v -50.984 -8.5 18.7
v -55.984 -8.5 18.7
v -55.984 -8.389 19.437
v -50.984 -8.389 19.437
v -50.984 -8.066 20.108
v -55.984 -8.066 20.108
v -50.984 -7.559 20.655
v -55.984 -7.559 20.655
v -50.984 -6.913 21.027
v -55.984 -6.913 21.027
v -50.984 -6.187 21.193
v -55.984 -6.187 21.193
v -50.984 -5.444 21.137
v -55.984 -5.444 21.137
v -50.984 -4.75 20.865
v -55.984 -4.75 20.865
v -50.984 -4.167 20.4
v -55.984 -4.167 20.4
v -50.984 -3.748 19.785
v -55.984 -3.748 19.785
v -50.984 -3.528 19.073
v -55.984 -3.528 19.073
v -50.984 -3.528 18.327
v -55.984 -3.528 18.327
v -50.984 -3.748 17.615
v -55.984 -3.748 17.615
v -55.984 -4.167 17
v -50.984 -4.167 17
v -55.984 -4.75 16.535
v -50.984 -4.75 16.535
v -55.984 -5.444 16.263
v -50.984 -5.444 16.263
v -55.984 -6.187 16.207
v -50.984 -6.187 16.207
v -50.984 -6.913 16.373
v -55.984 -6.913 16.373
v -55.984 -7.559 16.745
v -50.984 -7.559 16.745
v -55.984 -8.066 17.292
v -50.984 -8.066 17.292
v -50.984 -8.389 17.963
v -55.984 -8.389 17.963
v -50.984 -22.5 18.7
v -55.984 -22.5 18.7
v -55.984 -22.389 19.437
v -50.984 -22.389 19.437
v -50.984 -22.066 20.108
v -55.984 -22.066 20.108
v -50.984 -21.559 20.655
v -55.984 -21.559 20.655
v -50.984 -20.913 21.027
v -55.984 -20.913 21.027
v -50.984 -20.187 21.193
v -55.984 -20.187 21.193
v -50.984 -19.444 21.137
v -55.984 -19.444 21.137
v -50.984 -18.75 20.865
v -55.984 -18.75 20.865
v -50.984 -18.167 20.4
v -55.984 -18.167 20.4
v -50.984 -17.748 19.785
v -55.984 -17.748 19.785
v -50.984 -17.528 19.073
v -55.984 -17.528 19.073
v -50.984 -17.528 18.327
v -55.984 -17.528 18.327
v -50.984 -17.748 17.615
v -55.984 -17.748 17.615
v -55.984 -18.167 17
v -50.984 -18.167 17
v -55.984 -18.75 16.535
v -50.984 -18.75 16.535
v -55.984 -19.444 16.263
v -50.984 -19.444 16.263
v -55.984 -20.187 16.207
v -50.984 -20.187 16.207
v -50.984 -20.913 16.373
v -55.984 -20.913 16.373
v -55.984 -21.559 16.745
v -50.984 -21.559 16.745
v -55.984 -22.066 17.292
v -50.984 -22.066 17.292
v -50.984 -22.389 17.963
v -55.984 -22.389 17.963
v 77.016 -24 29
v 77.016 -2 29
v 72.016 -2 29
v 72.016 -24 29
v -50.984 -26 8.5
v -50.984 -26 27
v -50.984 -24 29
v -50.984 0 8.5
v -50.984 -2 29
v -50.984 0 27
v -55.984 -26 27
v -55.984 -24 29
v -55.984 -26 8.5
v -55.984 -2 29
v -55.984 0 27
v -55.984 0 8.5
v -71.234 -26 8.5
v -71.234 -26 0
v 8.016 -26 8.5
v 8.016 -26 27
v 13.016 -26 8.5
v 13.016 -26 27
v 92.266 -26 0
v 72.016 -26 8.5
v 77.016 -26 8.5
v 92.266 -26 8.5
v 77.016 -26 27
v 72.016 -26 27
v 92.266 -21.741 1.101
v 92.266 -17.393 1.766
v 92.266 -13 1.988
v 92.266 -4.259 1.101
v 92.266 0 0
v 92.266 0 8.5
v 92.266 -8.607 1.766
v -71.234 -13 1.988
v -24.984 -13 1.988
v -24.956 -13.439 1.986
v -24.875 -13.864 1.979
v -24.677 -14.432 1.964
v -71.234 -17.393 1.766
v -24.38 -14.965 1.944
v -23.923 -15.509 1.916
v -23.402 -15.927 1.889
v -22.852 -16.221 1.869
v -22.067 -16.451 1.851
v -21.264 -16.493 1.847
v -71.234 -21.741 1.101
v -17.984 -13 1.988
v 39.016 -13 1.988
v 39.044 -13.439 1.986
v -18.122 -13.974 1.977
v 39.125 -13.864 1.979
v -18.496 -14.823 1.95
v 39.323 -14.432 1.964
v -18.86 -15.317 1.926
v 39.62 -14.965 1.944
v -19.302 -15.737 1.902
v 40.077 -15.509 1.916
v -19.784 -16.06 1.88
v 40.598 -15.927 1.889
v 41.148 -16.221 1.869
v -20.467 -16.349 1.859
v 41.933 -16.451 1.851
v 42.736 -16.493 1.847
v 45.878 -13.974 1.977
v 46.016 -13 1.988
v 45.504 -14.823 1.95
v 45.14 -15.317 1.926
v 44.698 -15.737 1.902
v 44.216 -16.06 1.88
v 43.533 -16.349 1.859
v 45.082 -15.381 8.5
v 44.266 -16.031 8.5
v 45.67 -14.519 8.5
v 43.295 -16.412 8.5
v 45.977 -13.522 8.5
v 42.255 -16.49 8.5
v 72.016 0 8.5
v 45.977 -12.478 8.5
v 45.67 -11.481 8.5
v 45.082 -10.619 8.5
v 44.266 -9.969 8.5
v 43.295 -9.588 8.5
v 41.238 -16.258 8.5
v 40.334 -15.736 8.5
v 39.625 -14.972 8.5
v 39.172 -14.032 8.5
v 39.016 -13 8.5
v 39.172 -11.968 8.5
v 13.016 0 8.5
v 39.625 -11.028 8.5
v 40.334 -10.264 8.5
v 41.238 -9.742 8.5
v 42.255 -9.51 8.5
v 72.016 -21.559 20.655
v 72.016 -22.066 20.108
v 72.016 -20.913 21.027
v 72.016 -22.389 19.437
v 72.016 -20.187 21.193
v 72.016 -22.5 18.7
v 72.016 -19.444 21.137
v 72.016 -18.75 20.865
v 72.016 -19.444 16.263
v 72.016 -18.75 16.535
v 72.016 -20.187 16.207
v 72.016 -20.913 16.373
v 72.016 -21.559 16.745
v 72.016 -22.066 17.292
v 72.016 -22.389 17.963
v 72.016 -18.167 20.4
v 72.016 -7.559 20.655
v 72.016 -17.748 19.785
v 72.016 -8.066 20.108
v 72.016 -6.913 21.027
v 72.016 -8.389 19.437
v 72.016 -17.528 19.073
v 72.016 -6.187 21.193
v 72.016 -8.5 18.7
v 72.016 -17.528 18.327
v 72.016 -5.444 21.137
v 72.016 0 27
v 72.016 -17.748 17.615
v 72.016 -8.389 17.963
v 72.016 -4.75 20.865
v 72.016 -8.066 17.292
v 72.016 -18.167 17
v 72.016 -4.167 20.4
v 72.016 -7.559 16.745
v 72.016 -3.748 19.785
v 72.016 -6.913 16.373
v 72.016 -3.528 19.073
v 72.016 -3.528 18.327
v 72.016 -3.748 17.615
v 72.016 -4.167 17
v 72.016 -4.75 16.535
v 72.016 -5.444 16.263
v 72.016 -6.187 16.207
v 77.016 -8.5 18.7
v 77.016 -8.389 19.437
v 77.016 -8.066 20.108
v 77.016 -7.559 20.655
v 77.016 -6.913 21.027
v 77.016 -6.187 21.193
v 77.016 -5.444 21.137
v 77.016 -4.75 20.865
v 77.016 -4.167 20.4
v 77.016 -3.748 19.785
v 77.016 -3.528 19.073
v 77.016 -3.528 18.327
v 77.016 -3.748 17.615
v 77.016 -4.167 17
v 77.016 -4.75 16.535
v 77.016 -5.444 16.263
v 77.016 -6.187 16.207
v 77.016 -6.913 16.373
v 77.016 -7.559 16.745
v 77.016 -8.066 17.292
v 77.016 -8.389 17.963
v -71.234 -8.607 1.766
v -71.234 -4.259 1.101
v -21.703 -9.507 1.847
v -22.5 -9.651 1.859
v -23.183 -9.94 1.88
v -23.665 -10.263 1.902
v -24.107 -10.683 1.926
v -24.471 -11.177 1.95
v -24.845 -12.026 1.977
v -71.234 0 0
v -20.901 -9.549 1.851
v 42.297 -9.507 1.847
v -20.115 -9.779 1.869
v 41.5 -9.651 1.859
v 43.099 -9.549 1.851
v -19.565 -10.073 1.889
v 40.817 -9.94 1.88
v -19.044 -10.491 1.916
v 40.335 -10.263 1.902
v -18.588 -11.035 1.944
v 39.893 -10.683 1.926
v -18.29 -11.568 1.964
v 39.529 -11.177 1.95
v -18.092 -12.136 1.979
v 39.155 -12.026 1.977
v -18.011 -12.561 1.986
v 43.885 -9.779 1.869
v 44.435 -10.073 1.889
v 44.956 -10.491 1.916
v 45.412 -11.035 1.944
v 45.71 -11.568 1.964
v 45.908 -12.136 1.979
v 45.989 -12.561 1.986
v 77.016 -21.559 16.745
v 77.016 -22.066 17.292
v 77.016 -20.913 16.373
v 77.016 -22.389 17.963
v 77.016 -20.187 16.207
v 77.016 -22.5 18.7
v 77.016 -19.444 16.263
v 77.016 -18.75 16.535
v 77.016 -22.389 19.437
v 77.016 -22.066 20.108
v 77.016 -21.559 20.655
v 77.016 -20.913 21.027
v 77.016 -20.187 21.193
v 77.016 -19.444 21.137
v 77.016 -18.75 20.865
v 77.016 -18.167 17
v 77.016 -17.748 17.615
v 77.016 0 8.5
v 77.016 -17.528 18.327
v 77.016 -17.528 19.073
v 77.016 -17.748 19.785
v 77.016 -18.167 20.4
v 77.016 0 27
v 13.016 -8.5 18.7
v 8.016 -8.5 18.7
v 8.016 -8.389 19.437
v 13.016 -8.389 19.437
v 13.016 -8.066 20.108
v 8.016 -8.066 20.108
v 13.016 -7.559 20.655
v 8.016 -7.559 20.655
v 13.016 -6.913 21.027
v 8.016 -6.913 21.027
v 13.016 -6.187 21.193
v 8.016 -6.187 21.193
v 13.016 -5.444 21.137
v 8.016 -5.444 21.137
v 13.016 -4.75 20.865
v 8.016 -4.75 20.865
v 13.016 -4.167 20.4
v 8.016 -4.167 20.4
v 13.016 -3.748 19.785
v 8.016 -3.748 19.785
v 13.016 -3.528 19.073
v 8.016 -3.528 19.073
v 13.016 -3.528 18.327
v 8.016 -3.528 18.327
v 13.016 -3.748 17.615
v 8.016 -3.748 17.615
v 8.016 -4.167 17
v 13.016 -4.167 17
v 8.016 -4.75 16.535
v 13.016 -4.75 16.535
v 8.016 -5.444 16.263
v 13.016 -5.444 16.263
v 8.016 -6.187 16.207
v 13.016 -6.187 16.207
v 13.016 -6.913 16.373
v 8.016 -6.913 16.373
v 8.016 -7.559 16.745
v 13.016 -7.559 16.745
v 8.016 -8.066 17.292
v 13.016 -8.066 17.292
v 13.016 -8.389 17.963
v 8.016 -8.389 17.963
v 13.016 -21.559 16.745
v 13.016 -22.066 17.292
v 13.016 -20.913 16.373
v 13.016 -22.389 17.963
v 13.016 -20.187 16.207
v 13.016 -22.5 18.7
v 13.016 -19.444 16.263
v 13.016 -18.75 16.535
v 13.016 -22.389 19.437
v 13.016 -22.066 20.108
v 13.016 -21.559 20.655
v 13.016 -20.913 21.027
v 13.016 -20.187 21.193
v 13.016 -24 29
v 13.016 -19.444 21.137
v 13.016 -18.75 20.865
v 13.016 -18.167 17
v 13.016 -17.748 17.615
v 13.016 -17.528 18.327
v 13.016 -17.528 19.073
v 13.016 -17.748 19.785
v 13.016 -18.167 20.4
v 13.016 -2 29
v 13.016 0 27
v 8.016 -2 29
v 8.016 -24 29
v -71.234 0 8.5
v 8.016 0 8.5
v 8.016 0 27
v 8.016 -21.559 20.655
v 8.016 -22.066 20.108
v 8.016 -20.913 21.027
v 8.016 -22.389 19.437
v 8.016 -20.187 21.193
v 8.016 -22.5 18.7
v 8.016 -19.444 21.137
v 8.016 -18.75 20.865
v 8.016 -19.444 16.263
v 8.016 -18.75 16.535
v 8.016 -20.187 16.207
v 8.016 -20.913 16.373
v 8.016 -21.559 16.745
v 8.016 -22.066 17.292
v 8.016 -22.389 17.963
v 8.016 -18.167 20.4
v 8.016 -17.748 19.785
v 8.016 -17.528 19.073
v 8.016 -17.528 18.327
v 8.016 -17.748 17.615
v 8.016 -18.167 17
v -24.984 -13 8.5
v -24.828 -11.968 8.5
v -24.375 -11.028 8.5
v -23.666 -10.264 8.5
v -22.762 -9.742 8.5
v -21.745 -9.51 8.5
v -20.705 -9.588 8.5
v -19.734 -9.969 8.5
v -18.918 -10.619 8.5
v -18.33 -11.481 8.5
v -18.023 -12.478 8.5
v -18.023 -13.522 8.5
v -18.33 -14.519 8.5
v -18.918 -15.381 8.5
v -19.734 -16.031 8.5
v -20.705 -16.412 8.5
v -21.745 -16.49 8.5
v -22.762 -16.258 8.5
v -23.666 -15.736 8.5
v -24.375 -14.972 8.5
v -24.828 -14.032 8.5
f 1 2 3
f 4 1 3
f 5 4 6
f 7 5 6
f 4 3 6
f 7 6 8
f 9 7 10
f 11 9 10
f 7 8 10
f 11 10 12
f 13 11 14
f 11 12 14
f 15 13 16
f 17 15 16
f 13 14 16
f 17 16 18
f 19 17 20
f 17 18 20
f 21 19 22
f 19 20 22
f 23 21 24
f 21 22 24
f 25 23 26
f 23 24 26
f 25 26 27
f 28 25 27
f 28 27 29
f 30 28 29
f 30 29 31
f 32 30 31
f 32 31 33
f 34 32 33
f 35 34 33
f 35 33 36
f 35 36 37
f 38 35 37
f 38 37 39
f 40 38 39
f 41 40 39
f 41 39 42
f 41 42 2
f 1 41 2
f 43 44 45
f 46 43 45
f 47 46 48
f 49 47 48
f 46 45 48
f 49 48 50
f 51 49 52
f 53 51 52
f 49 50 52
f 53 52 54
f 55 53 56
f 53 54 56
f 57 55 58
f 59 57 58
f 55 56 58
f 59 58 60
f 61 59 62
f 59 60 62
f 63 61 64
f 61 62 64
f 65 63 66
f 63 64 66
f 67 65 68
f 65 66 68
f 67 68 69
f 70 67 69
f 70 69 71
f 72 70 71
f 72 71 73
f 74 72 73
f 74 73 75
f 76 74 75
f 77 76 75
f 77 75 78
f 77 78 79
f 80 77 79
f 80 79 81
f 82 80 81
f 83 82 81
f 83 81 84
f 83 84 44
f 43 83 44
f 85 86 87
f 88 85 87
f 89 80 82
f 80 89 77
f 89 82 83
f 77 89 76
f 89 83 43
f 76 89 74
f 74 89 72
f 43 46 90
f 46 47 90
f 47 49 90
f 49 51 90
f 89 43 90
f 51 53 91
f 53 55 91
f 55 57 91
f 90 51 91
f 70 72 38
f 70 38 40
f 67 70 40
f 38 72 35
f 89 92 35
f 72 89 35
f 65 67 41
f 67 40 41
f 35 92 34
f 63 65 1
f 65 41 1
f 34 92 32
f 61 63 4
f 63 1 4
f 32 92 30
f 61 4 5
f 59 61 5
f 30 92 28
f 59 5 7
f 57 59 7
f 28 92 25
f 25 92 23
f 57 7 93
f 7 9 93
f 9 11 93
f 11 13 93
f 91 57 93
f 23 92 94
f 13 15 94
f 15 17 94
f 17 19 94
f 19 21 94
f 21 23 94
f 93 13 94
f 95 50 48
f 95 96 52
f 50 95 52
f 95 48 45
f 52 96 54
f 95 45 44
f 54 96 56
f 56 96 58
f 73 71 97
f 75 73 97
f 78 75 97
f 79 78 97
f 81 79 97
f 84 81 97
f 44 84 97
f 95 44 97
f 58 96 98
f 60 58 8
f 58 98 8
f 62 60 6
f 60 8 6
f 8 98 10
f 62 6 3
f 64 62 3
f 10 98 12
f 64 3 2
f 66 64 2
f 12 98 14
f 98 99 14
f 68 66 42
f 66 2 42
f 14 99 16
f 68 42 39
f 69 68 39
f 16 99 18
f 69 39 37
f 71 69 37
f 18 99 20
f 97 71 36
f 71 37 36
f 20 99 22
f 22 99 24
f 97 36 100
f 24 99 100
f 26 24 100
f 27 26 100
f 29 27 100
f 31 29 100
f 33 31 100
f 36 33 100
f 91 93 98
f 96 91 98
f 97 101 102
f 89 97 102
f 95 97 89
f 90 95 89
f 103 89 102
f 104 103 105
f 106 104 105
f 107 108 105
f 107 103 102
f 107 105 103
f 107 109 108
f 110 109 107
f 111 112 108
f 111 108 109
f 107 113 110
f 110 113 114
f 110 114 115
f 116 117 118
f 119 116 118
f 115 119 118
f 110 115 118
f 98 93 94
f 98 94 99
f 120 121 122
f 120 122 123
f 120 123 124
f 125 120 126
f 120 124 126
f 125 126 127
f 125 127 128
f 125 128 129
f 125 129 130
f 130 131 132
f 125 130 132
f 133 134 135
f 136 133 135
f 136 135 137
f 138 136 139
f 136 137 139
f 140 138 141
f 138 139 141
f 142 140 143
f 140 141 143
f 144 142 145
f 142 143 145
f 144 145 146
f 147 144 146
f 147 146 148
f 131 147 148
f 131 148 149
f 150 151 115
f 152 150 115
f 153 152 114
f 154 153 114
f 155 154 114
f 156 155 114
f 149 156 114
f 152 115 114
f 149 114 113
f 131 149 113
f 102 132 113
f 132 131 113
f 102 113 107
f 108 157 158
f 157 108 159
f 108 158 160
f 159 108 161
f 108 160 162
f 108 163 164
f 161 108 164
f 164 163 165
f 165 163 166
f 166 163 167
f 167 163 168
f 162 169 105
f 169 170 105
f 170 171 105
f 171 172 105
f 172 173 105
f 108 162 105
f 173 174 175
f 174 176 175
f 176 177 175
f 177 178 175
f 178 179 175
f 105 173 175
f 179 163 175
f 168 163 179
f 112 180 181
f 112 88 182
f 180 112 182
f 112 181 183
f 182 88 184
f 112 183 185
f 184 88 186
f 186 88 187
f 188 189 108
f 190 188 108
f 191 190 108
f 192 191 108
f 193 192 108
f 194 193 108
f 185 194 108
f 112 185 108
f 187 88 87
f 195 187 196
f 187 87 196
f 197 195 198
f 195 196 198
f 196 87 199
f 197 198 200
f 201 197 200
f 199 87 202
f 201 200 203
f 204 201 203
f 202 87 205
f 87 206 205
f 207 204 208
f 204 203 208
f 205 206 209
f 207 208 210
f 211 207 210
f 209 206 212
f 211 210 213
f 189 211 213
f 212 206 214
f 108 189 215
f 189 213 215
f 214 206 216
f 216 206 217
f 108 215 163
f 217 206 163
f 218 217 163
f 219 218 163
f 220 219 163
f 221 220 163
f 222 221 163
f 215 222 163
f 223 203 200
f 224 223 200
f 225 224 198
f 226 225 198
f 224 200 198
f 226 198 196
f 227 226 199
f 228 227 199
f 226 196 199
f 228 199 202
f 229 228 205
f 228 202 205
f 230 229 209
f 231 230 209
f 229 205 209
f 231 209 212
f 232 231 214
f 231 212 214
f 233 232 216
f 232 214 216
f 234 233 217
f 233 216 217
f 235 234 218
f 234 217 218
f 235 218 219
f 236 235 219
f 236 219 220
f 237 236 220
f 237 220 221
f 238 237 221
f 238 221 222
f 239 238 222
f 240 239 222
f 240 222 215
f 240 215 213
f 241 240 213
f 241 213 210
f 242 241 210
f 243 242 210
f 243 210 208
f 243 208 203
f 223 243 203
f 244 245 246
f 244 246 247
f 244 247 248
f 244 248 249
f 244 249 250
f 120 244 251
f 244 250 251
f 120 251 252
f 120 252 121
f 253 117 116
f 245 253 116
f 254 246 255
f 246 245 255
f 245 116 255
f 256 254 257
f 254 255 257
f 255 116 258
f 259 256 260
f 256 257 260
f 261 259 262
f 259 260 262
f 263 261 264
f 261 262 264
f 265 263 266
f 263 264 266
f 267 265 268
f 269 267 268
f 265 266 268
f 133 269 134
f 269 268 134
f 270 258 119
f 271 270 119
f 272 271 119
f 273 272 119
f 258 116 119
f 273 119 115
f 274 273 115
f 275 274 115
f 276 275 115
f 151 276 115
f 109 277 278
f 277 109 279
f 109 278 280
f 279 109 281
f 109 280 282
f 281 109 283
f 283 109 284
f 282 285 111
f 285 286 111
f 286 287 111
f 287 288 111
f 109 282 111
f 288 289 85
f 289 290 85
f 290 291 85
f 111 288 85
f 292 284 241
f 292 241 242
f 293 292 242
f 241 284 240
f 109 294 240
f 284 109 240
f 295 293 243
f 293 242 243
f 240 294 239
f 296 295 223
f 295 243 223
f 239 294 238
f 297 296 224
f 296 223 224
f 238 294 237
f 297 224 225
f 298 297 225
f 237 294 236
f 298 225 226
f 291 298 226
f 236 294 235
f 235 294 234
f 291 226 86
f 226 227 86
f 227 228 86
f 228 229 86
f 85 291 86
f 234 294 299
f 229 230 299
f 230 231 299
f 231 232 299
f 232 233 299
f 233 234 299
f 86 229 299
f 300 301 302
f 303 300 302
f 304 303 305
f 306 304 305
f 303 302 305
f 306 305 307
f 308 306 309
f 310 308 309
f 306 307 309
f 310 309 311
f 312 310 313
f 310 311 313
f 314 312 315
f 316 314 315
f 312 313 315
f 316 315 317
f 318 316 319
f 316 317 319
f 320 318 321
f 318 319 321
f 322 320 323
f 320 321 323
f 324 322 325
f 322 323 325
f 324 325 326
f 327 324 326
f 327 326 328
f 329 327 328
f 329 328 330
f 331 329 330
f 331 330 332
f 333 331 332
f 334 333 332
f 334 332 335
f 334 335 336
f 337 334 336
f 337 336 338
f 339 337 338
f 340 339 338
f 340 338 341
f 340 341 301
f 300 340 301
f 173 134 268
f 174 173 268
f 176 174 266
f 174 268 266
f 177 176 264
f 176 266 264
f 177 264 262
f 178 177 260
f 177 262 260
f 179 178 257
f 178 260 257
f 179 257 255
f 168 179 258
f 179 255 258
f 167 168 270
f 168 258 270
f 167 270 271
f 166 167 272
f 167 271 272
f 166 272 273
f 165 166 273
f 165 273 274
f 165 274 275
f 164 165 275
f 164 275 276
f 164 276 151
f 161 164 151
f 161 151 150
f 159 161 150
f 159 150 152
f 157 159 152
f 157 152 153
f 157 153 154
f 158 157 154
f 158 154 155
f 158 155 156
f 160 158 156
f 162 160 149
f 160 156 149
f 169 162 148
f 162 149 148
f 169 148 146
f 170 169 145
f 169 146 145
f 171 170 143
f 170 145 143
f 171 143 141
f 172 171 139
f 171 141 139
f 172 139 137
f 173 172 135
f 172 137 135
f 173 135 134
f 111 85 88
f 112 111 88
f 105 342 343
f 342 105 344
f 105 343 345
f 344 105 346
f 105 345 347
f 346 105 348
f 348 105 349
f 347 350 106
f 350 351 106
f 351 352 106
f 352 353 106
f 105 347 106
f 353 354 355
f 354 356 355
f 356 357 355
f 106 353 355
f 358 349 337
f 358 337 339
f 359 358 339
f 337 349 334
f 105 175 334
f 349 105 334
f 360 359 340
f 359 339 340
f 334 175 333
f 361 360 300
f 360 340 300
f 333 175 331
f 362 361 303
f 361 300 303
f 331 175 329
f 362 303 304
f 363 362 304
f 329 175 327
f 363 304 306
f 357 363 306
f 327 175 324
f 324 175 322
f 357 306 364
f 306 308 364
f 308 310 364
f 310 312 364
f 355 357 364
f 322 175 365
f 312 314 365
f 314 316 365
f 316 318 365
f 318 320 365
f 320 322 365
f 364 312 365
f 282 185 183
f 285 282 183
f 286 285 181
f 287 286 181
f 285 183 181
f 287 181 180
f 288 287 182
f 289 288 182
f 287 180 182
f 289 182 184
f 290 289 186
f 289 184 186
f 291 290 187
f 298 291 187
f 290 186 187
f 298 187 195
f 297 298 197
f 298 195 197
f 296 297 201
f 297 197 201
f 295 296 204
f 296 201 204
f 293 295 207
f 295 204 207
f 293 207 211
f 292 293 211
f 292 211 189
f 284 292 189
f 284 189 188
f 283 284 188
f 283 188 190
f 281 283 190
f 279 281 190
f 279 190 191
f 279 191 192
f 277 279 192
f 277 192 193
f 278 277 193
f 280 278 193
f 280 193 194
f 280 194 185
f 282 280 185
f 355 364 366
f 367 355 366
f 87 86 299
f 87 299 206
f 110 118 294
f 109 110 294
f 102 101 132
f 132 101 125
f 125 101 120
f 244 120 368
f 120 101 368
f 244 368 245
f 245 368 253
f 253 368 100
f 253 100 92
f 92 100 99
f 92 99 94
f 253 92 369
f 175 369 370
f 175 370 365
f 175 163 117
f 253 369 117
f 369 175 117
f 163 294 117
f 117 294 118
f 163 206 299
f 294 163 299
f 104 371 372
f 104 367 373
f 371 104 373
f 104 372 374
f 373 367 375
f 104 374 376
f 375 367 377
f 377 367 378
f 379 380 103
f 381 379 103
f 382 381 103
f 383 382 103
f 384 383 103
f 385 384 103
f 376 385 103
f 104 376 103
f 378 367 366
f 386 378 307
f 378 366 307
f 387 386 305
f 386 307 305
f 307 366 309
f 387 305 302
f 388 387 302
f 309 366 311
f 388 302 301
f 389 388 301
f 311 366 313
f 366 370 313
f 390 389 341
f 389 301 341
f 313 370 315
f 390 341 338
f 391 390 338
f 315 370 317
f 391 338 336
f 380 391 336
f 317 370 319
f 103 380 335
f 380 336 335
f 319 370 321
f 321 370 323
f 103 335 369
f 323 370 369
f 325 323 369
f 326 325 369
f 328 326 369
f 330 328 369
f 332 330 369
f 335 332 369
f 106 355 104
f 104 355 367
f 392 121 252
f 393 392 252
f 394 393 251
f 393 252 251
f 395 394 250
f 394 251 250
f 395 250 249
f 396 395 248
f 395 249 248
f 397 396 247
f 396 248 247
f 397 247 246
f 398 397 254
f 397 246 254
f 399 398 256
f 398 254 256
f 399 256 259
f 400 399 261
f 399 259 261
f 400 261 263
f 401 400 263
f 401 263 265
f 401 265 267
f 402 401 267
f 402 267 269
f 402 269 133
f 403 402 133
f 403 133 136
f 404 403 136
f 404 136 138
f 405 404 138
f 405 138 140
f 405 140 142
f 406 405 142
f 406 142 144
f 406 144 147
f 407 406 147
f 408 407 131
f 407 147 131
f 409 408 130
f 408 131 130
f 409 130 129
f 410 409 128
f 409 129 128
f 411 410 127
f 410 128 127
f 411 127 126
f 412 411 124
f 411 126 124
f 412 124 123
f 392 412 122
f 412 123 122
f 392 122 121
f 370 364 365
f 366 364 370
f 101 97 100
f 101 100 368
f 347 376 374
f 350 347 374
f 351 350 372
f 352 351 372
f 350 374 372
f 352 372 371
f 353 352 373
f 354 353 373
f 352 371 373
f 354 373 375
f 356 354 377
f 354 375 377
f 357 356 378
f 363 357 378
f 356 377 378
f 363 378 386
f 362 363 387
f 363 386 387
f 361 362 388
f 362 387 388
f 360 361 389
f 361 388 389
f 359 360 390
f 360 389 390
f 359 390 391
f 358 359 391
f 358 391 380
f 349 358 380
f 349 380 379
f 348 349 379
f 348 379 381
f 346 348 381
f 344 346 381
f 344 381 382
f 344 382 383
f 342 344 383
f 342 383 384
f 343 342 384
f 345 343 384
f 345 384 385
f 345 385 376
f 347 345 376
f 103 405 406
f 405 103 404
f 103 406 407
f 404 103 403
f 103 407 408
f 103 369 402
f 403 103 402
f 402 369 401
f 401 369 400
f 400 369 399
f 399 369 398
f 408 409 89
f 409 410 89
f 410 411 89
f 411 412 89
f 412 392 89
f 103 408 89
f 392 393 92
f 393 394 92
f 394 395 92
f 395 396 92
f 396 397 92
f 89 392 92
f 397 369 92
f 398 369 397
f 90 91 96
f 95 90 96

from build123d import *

# Parameters (mm, degrees)
F1_DEPTH = 26
F3_DEPTH = 200
F4_SIZE2 = 2
F4_SIZE  = 2
F5_D     = 5
F5_DEPTH = 300
F5_START = 15.25
F5_TIP   = 1.5021515476
F8_D     = 7
F8_DEPTH = 300
F8_TIP   = 2.1030121666


with BuildPart() as f1:
    # F0 (on Front) → F1 (new body)
    with BuildSketch(Plane.XZ):
        Polygon((-71.2336192391, 8.5), (-71.2336192391, 0), (92.2663807609, 0), (92.2663807609, 8.5), (77.0163807609, 8.5), (77.0163807609, 29), (72.0163807609, 29), (72.0163807609, 8.5), (13.0163807609, 8.5), (13.0163807609, 29), (8.0163807609, 29), (8.0163807609, 8.5), (-50.9836192391, 8.5), (-50.9836192391, 29), (-55.9836192391, 29), (-55.9836192391, 8.5), align=None)
    extrude(amount=F1_DEPTH)

    # F2 (on face) → F3 (cut)
    with BuildSketch(Plane.YZ.offset(92.2663807609)):
        with BuildLine():
            ThreePointArc((-13, 1.9879535556), (-19.5755600396, 1.4880932085), (-26, 0))
            Line((-26, 0), (-13, 0))
            Line((-13, 0), (-13, 1.9879535556))
        make_face()
        with BuildLine():
            ThreePointArc((0, 0), (-6.4244399604, 1.4880932085), (-13, 1.9879535556))
            Line((-13, 1.9879535556), (-13, 0))
            Line((-13, 0), (0, 0))
        make_face()
    extrude(amount=-F3_DEPTH, mode=Mode.SUBTRACT)

    # F4
    f4_edges = [f1.edges().sort_by_distance(p)[0] for p in [
        (74.516381, 0, 29),
        (74.516381, -26, 29),
        (10.516381, -26, 29),
        (10.516381, 0, 29),
        (-53.483619, -26, 29),
        (-53.483619, 0, 29),
    ]]
    chamfer(f4_edges, length=F4_SIZE, length2=F4_SIZE2)

    # F5
    # its depths count from where the whole tool has entered the part; down to there all is cleared
    with Locations(Plane.YZ.offset(92.2663807609).offset(-F5_START)):
        with Locations((-20, 18.7), (-6, 18.7)):
            Hole(F5_D / 2, depth=F5_DEPTH)
            with Locations((0, 0, -(F5_DEPTH + F5_TIP / 2))):  # 118° drill point
                Cone(0, F5_D / 2, F5_TIP, mode=Mode.SUBTRACT)

    # F8
    with Locations(Plane.XY.offset(8.5)):
        with Locations((-21.4836192391, -13), (42.5163807609, -13)):
            Hole(F8_D / 2, depth=F8_DEPTH)
            with Locations((0, 0, -(F8_DEPTH + F8_TIP / 2))):  # 118° drill point
                Cone(0, F8_D / 2, F8_TIP, mode=Mode.SUBTRACT)


solid = f1.part
